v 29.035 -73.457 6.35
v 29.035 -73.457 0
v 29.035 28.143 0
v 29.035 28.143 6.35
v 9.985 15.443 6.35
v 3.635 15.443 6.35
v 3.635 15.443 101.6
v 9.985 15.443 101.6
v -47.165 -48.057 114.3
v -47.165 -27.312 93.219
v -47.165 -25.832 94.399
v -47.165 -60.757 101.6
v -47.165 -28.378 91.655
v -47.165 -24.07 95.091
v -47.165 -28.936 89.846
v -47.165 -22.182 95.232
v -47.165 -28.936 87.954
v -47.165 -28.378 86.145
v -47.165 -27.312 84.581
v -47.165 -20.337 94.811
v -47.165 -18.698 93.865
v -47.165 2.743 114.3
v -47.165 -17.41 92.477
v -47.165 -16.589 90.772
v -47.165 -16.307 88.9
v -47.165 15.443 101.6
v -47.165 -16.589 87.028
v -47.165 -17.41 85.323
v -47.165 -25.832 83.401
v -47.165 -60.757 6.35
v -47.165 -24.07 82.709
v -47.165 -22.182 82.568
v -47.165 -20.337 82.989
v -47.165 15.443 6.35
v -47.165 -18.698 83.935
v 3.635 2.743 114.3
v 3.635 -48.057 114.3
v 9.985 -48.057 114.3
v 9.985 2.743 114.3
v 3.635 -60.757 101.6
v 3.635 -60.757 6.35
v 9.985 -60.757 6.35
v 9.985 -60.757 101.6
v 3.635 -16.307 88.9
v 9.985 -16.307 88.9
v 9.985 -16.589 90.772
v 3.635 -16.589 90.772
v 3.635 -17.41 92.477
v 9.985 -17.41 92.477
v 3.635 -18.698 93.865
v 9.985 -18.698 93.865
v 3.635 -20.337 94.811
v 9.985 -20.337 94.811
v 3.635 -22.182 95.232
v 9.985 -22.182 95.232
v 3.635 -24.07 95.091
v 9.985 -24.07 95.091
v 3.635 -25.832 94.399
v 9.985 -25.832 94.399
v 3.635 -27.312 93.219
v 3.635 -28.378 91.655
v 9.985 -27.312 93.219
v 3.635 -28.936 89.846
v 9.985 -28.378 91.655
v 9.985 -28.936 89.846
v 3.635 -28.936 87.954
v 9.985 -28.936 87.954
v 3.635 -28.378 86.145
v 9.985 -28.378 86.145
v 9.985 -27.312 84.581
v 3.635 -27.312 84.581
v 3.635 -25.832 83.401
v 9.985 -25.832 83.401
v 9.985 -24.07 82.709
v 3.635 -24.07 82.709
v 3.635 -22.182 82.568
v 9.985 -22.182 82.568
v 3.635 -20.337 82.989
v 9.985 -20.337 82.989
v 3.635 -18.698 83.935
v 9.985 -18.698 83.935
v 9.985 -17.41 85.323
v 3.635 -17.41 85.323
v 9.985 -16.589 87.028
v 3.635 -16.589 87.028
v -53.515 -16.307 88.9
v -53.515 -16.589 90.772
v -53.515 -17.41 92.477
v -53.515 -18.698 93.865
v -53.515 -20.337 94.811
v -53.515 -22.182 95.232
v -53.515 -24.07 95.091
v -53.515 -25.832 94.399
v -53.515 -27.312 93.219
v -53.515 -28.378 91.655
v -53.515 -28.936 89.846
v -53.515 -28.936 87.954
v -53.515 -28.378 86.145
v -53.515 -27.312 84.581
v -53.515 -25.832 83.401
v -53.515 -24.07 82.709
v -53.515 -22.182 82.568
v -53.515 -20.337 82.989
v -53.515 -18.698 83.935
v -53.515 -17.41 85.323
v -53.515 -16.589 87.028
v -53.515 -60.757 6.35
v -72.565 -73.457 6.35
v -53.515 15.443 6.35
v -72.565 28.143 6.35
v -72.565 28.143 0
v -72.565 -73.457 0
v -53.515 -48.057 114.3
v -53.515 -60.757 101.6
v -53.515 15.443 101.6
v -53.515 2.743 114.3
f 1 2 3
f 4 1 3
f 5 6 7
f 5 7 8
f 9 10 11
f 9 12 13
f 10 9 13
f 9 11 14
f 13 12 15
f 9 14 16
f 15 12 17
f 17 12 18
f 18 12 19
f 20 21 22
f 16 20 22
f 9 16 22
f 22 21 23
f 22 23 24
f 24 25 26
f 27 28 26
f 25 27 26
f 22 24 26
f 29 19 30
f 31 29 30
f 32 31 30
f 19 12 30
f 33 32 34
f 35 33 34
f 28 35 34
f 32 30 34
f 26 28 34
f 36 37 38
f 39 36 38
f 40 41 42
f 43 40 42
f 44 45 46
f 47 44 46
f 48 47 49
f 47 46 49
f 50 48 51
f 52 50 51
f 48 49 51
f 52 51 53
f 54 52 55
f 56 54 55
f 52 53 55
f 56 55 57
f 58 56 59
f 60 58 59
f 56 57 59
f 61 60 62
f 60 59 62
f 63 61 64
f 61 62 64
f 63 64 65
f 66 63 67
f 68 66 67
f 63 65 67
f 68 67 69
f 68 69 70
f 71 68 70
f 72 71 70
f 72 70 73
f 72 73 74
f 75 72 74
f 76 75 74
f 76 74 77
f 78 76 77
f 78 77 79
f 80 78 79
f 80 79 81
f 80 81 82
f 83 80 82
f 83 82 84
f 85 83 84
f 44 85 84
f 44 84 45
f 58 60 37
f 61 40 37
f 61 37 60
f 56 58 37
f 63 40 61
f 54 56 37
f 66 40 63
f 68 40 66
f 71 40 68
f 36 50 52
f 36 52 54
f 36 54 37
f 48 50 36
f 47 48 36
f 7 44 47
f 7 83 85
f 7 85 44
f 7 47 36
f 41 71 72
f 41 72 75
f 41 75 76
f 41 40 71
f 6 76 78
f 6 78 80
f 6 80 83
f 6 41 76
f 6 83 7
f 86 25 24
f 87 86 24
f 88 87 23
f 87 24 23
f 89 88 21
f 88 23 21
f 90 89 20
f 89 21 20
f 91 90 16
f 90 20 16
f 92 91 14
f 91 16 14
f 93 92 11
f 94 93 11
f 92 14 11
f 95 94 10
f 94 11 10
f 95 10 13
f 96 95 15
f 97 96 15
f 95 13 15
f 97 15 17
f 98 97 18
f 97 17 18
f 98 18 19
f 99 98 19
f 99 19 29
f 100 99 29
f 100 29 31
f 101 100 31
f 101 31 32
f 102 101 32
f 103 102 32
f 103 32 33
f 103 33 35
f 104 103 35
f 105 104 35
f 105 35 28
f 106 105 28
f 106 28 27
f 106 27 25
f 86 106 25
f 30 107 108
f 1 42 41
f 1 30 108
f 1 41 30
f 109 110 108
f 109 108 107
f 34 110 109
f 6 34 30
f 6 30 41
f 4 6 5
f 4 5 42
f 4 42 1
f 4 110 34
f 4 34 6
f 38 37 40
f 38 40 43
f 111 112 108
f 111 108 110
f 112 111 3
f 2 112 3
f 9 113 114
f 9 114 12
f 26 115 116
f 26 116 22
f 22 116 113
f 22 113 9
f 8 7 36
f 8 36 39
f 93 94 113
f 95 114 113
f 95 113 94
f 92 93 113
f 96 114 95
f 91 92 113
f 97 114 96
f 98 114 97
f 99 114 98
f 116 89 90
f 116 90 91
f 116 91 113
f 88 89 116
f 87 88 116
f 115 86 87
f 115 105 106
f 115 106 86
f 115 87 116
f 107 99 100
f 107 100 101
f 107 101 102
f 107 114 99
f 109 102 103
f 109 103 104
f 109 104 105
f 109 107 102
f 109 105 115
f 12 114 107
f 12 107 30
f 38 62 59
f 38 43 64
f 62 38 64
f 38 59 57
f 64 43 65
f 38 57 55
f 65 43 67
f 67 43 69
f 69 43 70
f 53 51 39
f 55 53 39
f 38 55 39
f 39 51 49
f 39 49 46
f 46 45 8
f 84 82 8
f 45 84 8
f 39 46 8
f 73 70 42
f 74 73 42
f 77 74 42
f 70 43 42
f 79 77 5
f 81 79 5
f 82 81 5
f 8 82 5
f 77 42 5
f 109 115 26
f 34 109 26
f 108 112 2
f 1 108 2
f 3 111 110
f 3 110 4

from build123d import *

# Parameters (mm, degrees)
F0_W     = 101.6
F0_H     = 101.6
F1_DEPTH = 6.35
F2_W     = 6.35
F2_H     = 76.2
F3_DEPTH = 107.95
F4_R     = 6.35
F5_DEPTH = 82.551
F6_SIZE  = 12.7


with BuildPart() as f1:
    # F0 (on Top) → F1 (new body)
    with BuildSketch(Plane.XY):
        with Locations((-21.764829, -22.656878)):
            Rectangle(F0_W, F0_H)
    extrude(amount=F1_DEPTH)

    # F2 (on face) → F3 (join)
    with BuildSketch(Plane.XY.offset(6.35)):
        with Locations((-50.339829, -22.656878)):
            Rectangle(F2_W, F2_H)
        with Locations((6.810171, -22.656878)):
            Rectangle(F2_W, F2_H)
    extrude(amount=F3_DEPTH)

    # F4 (on face) → F5 (cut, through all)
    with BuildSketch(Plane.YZ.offset(9.985171)):
        with Locations((-22.656878, 88.9)):
            Circle(F4_R)
    extrude(amount=-F5_DEPTH, mode=Mode.SUBTRACT)

    # F6
    f6_edges = [f1.edges().sort_by_distance(p)[0] for p in [
        (6.810171, -60.756878, 114.3),
        (6.810171, 15.443122, 114.3),
        (-50.339829, -60.756878, 114.3),
        (-50.339829, 15.443122, 114.3),
    ]]
    chamfer(f6_edges, length=F6_SIZE)


solid = f1.part
